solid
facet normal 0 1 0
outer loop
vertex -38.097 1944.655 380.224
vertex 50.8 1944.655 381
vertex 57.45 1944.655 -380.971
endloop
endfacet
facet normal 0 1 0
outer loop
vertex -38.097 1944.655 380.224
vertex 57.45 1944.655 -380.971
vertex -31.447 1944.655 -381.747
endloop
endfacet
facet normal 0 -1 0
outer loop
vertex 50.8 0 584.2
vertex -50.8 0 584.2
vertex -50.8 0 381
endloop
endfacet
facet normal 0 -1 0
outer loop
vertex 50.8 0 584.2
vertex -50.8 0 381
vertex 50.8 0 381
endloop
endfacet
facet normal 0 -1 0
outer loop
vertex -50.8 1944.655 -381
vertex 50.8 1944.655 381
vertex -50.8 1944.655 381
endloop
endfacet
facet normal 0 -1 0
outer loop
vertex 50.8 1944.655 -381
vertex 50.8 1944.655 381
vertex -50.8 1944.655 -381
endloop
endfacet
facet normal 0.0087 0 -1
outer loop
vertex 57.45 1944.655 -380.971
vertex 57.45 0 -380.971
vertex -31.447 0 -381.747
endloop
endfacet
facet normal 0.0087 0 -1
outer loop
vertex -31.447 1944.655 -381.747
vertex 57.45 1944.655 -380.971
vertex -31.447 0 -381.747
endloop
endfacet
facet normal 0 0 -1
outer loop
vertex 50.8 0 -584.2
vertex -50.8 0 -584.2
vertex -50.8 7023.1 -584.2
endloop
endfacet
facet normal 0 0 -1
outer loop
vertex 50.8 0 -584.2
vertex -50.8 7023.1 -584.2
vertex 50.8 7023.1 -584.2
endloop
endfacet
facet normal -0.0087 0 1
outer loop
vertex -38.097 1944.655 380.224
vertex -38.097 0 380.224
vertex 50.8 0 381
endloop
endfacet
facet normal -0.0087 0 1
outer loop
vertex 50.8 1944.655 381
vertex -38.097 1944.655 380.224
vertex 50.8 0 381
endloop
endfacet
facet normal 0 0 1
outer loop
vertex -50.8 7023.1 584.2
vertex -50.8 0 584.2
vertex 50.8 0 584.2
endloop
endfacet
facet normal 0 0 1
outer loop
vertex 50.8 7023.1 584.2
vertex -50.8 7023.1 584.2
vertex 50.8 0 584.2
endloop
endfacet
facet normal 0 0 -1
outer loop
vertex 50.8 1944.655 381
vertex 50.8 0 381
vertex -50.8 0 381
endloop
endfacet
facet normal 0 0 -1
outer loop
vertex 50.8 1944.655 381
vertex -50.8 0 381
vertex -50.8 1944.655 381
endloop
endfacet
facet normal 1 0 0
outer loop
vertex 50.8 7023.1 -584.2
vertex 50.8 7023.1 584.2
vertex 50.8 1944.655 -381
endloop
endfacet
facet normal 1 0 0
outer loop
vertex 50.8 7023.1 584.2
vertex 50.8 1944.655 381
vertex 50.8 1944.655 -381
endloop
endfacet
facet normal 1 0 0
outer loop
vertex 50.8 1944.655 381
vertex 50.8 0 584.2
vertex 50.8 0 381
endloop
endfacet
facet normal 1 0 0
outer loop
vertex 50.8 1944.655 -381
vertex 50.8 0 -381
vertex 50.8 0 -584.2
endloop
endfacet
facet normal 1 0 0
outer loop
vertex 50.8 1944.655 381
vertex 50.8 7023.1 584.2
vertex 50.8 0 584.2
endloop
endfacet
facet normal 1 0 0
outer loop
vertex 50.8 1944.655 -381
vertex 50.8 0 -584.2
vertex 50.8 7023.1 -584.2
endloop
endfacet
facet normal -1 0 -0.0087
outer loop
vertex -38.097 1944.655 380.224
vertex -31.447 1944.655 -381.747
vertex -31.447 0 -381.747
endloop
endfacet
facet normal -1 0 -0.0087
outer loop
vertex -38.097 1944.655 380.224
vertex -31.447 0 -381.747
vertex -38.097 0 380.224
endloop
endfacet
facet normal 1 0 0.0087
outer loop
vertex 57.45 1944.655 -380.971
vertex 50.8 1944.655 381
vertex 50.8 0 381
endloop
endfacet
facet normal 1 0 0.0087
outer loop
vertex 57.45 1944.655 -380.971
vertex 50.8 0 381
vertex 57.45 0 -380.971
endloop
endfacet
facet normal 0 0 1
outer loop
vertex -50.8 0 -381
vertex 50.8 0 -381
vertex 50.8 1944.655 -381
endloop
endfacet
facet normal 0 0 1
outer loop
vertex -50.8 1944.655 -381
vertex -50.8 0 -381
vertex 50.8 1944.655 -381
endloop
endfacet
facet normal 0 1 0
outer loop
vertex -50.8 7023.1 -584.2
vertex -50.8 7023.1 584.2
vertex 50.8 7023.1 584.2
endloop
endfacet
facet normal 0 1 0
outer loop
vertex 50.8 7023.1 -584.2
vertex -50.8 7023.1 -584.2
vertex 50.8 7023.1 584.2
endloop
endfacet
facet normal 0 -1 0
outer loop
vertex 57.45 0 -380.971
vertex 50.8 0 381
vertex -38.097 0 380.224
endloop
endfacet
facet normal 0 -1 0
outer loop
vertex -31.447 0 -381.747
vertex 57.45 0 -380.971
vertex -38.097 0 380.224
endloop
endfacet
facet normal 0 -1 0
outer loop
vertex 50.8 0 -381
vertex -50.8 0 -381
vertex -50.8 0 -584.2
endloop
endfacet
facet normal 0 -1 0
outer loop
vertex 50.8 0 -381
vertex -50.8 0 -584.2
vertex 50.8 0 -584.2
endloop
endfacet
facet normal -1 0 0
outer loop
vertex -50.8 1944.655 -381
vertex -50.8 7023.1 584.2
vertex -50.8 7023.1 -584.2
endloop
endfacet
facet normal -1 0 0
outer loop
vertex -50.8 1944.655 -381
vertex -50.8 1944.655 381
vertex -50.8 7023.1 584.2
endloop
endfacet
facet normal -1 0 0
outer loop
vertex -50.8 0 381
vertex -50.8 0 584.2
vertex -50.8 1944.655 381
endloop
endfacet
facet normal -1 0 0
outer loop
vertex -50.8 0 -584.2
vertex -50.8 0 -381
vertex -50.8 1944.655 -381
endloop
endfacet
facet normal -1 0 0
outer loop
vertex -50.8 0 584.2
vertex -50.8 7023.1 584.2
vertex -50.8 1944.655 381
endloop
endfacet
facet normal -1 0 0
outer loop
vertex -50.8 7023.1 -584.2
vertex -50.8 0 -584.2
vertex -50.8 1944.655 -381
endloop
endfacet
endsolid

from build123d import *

# Parameters (mm, degrees)
SKETCH1_W           = 101.6
SKETCH1_H           = 1168.4
BOSS_EXTRUDE1_DEPTH = 7023.1
SKETCH3_W           = 762
SKETCH3_H           = 1944.654801242
CUT_EXTRUDE2_DEPTH  = 7049.088096073
BOSS_EXTRUDE2_DEPTH = 1944.654801242


with BuildPart() as part:
    # Sketch1 → Boss-Extrude1 (new body)
    with BuildSketch(Plane(origin=(0, 0, 0), x_dir=(1, 0, 0), z_dir=(0, 1, 0))):
        Rectangle(SKETCH1_W, SKETCH1_H)
    extrude(amount=BOSS_EXTRUDE1_DEPTH)

    # Sketch3 → Cut-Extrude2 (cut, through all)
    with BuildSketch(Plane(origin=(50.8, 0, 0), x_dir=(0, 0, -1), z_dir=(1, 0, 0))):
        with Locations((0, 972.327400621)):
            Rectangle(SKETCH3_W, SKETCH3_H)
    extrude(amount=-CUT_EXTRUDE2_DEPTH, mode=Mode.SUBTRACT)


with BuildPart() as body_2:
    # Sketch8 → Boss-Extrude2 (new body)
    with BuildSketch(Plane.XZ.offset(-1944.654801242)):
        Polygon((50.8, 381), (57.44962005, -380.970985375), (-31.446994911, -381.746774381), (-38.09661496, 380.224210994), align=None)
    extrude(amount=BOSS_EXTRUDE2_DEPTH)


solid = Compound([part.part, body_2.part])
